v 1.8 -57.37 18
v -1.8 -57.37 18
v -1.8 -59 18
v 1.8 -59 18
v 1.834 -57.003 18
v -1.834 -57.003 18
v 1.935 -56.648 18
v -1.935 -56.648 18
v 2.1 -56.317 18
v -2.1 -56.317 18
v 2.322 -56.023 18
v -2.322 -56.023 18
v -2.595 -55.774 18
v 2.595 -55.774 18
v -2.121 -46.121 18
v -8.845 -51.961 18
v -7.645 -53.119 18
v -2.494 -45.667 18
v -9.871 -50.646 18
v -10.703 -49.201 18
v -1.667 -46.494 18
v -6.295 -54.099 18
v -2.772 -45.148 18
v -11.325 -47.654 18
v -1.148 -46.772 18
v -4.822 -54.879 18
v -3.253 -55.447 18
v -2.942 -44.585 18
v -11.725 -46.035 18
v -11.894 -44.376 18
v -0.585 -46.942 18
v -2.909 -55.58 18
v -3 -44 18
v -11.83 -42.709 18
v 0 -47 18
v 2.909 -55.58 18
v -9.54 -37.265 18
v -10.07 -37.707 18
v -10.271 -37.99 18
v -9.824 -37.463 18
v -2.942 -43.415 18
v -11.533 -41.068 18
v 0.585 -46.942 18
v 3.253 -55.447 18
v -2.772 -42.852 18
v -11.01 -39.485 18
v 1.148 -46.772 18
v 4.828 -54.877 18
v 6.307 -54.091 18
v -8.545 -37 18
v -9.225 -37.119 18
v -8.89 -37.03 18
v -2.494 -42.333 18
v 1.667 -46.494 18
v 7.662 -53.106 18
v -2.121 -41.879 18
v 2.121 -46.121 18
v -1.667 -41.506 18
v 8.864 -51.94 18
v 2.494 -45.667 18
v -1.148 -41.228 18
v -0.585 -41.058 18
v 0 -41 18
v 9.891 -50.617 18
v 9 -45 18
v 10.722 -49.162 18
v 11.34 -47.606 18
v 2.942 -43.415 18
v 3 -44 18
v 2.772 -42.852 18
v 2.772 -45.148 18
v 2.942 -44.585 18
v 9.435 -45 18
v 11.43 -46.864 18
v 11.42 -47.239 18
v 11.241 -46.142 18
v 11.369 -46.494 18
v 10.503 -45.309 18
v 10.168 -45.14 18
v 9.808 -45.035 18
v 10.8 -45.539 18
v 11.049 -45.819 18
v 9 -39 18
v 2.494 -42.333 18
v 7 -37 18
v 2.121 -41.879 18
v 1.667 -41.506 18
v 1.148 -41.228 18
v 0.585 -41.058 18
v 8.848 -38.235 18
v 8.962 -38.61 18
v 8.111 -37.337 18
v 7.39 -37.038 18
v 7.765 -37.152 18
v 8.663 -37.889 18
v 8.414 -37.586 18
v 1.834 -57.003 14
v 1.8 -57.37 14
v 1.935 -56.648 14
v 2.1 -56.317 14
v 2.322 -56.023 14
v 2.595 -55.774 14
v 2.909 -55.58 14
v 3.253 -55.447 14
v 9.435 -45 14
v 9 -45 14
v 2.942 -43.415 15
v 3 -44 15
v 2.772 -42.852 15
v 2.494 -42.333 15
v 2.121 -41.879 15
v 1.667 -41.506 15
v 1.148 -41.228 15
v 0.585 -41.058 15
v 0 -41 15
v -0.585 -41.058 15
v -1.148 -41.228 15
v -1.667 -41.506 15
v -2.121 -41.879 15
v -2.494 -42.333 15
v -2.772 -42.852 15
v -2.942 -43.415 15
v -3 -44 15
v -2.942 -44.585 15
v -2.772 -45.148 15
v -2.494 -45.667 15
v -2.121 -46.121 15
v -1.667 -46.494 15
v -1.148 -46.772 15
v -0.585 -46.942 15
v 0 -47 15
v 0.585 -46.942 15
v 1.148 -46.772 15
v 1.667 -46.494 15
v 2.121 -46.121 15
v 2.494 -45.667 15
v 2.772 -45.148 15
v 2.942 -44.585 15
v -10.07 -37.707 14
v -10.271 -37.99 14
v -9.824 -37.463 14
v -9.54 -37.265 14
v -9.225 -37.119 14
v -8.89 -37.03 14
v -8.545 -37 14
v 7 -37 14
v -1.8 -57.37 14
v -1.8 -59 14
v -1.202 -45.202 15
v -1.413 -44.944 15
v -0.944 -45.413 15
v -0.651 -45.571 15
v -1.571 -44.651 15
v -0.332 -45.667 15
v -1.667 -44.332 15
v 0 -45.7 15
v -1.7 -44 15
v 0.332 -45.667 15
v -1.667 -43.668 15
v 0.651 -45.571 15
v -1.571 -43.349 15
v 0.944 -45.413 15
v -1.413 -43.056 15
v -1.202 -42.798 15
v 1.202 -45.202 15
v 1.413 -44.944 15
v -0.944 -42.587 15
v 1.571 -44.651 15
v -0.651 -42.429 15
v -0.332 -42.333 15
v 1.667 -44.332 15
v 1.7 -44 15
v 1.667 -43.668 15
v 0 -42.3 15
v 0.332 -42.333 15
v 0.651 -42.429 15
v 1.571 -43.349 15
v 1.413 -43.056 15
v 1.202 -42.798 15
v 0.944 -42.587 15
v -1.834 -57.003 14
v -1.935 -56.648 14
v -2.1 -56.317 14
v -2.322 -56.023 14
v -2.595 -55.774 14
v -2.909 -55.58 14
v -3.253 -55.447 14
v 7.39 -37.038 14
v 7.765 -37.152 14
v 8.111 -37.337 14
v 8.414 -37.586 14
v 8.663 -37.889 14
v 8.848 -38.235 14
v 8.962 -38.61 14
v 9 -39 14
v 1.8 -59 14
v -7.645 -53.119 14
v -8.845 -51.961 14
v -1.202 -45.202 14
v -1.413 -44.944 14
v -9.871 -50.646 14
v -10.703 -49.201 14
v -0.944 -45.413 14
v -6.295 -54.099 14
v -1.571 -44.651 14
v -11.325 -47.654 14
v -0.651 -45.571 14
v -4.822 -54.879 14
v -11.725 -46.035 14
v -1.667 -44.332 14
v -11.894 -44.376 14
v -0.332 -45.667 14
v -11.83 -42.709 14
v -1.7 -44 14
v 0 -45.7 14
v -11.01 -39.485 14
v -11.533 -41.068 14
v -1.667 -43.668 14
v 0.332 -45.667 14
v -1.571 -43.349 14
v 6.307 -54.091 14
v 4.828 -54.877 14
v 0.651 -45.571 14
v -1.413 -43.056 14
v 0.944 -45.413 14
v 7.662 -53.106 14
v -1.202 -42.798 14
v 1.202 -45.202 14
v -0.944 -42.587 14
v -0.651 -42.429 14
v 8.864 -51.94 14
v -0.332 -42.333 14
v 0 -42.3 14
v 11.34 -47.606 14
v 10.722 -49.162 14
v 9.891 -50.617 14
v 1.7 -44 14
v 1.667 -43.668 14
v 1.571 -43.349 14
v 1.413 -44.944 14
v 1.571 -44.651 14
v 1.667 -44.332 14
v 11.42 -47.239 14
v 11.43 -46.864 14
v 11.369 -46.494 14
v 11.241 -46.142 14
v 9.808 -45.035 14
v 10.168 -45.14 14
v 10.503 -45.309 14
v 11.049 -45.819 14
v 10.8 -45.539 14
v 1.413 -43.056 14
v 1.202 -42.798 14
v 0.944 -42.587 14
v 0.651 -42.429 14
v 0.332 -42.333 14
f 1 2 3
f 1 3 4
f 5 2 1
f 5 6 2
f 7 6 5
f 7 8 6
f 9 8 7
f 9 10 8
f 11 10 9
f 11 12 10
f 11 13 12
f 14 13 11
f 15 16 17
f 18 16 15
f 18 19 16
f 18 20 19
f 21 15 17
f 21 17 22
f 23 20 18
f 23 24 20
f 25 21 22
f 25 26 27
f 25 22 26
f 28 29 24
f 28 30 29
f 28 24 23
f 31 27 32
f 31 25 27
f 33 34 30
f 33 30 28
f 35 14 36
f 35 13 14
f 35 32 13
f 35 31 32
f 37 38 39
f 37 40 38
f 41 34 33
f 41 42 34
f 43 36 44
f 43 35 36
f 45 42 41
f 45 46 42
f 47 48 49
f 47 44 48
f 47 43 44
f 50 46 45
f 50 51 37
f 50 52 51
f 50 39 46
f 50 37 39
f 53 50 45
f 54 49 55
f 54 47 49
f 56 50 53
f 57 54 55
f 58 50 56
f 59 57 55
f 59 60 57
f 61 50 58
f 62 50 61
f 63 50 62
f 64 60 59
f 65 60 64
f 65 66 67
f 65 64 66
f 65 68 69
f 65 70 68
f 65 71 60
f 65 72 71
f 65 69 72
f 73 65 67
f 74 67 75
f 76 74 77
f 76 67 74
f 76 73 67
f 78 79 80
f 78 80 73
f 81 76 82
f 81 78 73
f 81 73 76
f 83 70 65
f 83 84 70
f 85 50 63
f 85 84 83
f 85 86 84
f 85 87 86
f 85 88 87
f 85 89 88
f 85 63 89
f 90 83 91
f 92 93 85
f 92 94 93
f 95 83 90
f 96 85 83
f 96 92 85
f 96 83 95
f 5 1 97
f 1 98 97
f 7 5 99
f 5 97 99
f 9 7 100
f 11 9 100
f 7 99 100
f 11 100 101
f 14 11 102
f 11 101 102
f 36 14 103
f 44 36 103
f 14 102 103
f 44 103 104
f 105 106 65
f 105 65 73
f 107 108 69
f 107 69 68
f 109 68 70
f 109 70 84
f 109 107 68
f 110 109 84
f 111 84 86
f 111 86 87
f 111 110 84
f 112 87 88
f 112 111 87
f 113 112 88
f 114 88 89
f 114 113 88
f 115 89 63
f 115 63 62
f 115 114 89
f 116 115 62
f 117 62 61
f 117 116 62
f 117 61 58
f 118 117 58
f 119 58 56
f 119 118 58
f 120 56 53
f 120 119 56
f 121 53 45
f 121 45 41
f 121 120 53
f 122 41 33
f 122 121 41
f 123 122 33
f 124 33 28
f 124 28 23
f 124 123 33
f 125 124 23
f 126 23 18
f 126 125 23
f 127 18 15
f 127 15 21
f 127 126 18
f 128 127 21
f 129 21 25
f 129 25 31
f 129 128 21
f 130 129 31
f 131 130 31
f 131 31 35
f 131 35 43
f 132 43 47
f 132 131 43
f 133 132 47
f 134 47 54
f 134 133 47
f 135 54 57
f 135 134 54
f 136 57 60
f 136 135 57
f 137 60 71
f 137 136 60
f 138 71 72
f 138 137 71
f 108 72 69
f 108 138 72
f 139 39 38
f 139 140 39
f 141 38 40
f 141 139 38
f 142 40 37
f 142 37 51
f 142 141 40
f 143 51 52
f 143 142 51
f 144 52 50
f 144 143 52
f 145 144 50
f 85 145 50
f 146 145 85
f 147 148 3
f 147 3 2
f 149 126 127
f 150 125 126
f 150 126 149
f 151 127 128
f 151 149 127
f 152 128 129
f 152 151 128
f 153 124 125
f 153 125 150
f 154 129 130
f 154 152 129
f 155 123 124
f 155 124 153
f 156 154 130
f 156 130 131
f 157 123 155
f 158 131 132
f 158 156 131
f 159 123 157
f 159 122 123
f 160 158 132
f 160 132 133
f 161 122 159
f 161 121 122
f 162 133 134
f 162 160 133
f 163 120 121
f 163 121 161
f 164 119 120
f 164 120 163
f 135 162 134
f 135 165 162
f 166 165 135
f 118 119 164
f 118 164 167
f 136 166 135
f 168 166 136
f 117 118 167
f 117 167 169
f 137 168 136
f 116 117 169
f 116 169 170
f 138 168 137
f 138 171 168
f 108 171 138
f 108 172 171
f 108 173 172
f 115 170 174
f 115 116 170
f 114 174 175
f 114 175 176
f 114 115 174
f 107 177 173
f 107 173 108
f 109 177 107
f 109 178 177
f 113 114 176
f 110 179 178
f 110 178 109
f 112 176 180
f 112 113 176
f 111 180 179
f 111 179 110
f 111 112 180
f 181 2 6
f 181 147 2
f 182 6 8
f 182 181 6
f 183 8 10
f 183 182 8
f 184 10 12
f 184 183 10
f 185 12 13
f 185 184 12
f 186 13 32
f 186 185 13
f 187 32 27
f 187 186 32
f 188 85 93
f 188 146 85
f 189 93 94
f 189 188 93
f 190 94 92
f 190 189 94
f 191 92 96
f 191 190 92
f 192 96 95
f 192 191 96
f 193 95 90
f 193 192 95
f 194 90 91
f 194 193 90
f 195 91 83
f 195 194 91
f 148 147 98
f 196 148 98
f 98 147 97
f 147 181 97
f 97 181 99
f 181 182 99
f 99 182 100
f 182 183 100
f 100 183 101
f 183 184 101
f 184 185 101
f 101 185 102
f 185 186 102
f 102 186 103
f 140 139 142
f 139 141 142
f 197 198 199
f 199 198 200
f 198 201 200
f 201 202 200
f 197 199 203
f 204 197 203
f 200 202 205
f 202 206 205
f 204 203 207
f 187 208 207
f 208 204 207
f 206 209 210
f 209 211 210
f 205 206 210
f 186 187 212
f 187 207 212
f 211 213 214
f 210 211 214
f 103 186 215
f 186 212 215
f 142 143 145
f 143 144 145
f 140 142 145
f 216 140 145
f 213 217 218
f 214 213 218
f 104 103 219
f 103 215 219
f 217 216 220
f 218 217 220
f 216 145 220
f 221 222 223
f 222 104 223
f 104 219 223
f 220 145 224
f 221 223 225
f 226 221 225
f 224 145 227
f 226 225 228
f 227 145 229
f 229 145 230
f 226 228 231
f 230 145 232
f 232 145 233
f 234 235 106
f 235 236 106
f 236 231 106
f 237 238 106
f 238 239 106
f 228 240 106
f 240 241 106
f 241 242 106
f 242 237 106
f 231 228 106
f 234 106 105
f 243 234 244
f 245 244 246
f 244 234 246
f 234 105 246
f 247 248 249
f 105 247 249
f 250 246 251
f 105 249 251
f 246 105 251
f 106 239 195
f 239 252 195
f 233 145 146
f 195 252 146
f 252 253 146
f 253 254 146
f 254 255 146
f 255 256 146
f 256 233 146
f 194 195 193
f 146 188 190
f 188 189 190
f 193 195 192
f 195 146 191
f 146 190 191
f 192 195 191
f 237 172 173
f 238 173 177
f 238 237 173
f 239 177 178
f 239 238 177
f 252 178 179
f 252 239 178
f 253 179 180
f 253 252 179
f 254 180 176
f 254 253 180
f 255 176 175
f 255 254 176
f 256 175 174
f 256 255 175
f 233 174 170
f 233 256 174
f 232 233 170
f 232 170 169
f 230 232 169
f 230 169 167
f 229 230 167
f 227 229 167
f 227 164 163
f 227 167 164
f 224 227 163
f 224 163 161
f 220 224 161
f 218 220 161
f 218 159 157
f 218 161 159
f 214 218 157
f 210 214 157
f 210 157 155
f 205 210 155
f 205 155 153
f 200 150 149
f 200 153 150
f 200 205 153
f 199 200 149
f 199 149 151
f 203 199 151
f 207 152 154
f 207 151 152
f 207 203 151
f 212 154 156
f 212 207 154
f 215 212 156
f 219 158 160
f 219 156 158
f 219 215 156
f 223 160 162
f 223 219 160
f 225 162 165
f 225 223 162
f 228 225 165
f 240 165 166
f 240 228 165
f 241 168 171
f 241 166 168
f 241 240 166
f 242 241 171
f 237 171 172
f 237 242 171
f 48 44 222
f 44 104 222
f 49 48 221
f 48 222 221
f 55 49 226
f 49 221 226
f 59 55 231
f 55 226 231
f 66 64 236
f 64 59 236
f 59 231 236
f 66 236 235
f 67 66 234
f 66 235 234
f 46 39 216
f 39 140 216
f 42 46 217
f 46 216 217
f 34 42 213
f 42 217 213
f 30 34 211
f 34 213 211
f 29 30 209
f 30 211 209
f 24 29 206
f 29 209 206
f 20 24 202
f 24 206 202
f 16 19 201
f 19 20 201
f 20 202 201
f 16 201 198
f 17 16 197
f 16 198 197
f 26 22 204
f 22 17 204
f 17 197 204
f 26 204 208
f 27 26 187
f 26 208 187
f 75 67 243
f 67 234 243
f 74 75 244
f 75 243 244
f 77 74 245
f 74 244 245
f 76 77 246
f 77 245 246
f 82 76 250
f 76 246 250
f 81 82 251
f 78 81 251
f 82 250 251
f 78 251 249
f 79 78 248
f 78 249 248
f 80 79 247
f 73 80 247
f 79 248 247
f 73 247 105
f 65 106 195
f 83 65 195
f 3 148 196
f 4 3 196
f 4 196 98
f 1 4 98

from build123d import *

# Parameters (mm, degrees)
CYLINDER096_R     = 3
CYLINDER096_DEPTH = 3
CYLINDER095_R     = 1.7
CYLINDER095_DEPTH = 4
BOX019_W          = 24
BOX019_H          = 10
BOX019_DEPTH      = 4
BOX020_W          = 24
BOX020_H          = 10
BOX020_DEPTH      = 4
BOX021_W          = 3.6
BOX021_H          = 4
BOX021_DEPTH      = 4
CYLINDER094_R     = 11.9
CYLINDER094_DEPTH = 4
FILLET_R          = 2


with BuildPart() as deltacylindernuthead:
    # Cylinder096 → Cylinder096 (new body)
    with BuildSketch(Plane(origin=(0, -44, 15), x_dir=(1, 0, 0), z_dir=(0, 0, 1))):
        Circle(CYLINDER096_R)
    extrude(amount=CYLINDER096_DEPTH)


with BuildPart() as deltacylinderm3:
    # Cylinder095 → Cylinder095 (new body)
    with BuildSketch(Plane(origin=(0, -44, 14), x_dir=(1, 0, 0), z_dir=(0, 0, 1))):
        Circle(CYLINDER095_R)
    extrude(amount=CYLINDER095_DEPTH)


with BuildPart() as deltacube003:
    # Box019 → Box019 (new body)
    with BuildSketch(Plane(origin=(-12, -37, 14), x_dir=(1, 0, 0), z_dir=(0, 0, 1))):
        with Locations((12, 5)):
            Rectangle(BOX019_W, BOX019_H)
    extrude(amount=BOX019_DEPTH)


with BuildPart() as deltacube004:
    # Box020 → Box020 (new body)
    with BuildSketch(Plane(origin=(9, -45, 14), x_dir=(1, 0, 0), z_dir=(0, 0, 1))):
        with Locations((12, 5)):
            Rectangle(BOX020_W, BOX020_H)
    extrude(amount=BOX020_DEPTH)


with BuildPart() as cubealignment:
    # Box021 → Box021 (new body)
    with BuildSketch(Plane(origin=(-1.8, -59, 14), x_dir=(1, 0, 0), z_dir=(0, 0, 1))):
        with Locations((1.8, 2)):
            Rectangle(BOX021_W, BOX021_H)
    extrude(amount=BOX021_DEPTH)


with BuildPart() as bearingholdertop:
    # Cylinder094 → Cylinder094 (new body)
    with BuildSketch(Plane(origin=(0, -44, 14), x_dir=(1, 0, 0), z_dir=(0, 0, 1))):
        Circle(CYLINDER094_R)
    extrude(amount=CYLINDER094_DEPTH)

    # Fusion033: union CubeAlignment
    add(cubealignment.part)

    # Cut: cut DeltaCube004
    add(deltacube004.part, mode=Mode.SUBTRACT)

    # Cut052: cut DeltaCube003
    add(deltacube003.part, mode=Mode.SUBTRACT)

    # Cut053: cut DeltaCylinderM3
    add(deltacylinderm3.part, mode=Mode.SUBTRACT)

    # Cut054: cut DeltaCylinderNutHead
    add(deltacylindernuthead.part, mode=Mode.SUBTRACT)

    # Fillet
    fillet_edges = [bearingholdertop.edges().sort_by_distance(p)[0] for p in [
        (1.8, -55.763078, 16),
        (-1.8, -55.763078, 16),
        (11.857909, -45, 16),
        (-9.623409, -37, 16),
        (9, -37, 16),
    ]]
    fillet(fillet_edges, radius=FILLET_R)


solid = bearingholdertop.part
